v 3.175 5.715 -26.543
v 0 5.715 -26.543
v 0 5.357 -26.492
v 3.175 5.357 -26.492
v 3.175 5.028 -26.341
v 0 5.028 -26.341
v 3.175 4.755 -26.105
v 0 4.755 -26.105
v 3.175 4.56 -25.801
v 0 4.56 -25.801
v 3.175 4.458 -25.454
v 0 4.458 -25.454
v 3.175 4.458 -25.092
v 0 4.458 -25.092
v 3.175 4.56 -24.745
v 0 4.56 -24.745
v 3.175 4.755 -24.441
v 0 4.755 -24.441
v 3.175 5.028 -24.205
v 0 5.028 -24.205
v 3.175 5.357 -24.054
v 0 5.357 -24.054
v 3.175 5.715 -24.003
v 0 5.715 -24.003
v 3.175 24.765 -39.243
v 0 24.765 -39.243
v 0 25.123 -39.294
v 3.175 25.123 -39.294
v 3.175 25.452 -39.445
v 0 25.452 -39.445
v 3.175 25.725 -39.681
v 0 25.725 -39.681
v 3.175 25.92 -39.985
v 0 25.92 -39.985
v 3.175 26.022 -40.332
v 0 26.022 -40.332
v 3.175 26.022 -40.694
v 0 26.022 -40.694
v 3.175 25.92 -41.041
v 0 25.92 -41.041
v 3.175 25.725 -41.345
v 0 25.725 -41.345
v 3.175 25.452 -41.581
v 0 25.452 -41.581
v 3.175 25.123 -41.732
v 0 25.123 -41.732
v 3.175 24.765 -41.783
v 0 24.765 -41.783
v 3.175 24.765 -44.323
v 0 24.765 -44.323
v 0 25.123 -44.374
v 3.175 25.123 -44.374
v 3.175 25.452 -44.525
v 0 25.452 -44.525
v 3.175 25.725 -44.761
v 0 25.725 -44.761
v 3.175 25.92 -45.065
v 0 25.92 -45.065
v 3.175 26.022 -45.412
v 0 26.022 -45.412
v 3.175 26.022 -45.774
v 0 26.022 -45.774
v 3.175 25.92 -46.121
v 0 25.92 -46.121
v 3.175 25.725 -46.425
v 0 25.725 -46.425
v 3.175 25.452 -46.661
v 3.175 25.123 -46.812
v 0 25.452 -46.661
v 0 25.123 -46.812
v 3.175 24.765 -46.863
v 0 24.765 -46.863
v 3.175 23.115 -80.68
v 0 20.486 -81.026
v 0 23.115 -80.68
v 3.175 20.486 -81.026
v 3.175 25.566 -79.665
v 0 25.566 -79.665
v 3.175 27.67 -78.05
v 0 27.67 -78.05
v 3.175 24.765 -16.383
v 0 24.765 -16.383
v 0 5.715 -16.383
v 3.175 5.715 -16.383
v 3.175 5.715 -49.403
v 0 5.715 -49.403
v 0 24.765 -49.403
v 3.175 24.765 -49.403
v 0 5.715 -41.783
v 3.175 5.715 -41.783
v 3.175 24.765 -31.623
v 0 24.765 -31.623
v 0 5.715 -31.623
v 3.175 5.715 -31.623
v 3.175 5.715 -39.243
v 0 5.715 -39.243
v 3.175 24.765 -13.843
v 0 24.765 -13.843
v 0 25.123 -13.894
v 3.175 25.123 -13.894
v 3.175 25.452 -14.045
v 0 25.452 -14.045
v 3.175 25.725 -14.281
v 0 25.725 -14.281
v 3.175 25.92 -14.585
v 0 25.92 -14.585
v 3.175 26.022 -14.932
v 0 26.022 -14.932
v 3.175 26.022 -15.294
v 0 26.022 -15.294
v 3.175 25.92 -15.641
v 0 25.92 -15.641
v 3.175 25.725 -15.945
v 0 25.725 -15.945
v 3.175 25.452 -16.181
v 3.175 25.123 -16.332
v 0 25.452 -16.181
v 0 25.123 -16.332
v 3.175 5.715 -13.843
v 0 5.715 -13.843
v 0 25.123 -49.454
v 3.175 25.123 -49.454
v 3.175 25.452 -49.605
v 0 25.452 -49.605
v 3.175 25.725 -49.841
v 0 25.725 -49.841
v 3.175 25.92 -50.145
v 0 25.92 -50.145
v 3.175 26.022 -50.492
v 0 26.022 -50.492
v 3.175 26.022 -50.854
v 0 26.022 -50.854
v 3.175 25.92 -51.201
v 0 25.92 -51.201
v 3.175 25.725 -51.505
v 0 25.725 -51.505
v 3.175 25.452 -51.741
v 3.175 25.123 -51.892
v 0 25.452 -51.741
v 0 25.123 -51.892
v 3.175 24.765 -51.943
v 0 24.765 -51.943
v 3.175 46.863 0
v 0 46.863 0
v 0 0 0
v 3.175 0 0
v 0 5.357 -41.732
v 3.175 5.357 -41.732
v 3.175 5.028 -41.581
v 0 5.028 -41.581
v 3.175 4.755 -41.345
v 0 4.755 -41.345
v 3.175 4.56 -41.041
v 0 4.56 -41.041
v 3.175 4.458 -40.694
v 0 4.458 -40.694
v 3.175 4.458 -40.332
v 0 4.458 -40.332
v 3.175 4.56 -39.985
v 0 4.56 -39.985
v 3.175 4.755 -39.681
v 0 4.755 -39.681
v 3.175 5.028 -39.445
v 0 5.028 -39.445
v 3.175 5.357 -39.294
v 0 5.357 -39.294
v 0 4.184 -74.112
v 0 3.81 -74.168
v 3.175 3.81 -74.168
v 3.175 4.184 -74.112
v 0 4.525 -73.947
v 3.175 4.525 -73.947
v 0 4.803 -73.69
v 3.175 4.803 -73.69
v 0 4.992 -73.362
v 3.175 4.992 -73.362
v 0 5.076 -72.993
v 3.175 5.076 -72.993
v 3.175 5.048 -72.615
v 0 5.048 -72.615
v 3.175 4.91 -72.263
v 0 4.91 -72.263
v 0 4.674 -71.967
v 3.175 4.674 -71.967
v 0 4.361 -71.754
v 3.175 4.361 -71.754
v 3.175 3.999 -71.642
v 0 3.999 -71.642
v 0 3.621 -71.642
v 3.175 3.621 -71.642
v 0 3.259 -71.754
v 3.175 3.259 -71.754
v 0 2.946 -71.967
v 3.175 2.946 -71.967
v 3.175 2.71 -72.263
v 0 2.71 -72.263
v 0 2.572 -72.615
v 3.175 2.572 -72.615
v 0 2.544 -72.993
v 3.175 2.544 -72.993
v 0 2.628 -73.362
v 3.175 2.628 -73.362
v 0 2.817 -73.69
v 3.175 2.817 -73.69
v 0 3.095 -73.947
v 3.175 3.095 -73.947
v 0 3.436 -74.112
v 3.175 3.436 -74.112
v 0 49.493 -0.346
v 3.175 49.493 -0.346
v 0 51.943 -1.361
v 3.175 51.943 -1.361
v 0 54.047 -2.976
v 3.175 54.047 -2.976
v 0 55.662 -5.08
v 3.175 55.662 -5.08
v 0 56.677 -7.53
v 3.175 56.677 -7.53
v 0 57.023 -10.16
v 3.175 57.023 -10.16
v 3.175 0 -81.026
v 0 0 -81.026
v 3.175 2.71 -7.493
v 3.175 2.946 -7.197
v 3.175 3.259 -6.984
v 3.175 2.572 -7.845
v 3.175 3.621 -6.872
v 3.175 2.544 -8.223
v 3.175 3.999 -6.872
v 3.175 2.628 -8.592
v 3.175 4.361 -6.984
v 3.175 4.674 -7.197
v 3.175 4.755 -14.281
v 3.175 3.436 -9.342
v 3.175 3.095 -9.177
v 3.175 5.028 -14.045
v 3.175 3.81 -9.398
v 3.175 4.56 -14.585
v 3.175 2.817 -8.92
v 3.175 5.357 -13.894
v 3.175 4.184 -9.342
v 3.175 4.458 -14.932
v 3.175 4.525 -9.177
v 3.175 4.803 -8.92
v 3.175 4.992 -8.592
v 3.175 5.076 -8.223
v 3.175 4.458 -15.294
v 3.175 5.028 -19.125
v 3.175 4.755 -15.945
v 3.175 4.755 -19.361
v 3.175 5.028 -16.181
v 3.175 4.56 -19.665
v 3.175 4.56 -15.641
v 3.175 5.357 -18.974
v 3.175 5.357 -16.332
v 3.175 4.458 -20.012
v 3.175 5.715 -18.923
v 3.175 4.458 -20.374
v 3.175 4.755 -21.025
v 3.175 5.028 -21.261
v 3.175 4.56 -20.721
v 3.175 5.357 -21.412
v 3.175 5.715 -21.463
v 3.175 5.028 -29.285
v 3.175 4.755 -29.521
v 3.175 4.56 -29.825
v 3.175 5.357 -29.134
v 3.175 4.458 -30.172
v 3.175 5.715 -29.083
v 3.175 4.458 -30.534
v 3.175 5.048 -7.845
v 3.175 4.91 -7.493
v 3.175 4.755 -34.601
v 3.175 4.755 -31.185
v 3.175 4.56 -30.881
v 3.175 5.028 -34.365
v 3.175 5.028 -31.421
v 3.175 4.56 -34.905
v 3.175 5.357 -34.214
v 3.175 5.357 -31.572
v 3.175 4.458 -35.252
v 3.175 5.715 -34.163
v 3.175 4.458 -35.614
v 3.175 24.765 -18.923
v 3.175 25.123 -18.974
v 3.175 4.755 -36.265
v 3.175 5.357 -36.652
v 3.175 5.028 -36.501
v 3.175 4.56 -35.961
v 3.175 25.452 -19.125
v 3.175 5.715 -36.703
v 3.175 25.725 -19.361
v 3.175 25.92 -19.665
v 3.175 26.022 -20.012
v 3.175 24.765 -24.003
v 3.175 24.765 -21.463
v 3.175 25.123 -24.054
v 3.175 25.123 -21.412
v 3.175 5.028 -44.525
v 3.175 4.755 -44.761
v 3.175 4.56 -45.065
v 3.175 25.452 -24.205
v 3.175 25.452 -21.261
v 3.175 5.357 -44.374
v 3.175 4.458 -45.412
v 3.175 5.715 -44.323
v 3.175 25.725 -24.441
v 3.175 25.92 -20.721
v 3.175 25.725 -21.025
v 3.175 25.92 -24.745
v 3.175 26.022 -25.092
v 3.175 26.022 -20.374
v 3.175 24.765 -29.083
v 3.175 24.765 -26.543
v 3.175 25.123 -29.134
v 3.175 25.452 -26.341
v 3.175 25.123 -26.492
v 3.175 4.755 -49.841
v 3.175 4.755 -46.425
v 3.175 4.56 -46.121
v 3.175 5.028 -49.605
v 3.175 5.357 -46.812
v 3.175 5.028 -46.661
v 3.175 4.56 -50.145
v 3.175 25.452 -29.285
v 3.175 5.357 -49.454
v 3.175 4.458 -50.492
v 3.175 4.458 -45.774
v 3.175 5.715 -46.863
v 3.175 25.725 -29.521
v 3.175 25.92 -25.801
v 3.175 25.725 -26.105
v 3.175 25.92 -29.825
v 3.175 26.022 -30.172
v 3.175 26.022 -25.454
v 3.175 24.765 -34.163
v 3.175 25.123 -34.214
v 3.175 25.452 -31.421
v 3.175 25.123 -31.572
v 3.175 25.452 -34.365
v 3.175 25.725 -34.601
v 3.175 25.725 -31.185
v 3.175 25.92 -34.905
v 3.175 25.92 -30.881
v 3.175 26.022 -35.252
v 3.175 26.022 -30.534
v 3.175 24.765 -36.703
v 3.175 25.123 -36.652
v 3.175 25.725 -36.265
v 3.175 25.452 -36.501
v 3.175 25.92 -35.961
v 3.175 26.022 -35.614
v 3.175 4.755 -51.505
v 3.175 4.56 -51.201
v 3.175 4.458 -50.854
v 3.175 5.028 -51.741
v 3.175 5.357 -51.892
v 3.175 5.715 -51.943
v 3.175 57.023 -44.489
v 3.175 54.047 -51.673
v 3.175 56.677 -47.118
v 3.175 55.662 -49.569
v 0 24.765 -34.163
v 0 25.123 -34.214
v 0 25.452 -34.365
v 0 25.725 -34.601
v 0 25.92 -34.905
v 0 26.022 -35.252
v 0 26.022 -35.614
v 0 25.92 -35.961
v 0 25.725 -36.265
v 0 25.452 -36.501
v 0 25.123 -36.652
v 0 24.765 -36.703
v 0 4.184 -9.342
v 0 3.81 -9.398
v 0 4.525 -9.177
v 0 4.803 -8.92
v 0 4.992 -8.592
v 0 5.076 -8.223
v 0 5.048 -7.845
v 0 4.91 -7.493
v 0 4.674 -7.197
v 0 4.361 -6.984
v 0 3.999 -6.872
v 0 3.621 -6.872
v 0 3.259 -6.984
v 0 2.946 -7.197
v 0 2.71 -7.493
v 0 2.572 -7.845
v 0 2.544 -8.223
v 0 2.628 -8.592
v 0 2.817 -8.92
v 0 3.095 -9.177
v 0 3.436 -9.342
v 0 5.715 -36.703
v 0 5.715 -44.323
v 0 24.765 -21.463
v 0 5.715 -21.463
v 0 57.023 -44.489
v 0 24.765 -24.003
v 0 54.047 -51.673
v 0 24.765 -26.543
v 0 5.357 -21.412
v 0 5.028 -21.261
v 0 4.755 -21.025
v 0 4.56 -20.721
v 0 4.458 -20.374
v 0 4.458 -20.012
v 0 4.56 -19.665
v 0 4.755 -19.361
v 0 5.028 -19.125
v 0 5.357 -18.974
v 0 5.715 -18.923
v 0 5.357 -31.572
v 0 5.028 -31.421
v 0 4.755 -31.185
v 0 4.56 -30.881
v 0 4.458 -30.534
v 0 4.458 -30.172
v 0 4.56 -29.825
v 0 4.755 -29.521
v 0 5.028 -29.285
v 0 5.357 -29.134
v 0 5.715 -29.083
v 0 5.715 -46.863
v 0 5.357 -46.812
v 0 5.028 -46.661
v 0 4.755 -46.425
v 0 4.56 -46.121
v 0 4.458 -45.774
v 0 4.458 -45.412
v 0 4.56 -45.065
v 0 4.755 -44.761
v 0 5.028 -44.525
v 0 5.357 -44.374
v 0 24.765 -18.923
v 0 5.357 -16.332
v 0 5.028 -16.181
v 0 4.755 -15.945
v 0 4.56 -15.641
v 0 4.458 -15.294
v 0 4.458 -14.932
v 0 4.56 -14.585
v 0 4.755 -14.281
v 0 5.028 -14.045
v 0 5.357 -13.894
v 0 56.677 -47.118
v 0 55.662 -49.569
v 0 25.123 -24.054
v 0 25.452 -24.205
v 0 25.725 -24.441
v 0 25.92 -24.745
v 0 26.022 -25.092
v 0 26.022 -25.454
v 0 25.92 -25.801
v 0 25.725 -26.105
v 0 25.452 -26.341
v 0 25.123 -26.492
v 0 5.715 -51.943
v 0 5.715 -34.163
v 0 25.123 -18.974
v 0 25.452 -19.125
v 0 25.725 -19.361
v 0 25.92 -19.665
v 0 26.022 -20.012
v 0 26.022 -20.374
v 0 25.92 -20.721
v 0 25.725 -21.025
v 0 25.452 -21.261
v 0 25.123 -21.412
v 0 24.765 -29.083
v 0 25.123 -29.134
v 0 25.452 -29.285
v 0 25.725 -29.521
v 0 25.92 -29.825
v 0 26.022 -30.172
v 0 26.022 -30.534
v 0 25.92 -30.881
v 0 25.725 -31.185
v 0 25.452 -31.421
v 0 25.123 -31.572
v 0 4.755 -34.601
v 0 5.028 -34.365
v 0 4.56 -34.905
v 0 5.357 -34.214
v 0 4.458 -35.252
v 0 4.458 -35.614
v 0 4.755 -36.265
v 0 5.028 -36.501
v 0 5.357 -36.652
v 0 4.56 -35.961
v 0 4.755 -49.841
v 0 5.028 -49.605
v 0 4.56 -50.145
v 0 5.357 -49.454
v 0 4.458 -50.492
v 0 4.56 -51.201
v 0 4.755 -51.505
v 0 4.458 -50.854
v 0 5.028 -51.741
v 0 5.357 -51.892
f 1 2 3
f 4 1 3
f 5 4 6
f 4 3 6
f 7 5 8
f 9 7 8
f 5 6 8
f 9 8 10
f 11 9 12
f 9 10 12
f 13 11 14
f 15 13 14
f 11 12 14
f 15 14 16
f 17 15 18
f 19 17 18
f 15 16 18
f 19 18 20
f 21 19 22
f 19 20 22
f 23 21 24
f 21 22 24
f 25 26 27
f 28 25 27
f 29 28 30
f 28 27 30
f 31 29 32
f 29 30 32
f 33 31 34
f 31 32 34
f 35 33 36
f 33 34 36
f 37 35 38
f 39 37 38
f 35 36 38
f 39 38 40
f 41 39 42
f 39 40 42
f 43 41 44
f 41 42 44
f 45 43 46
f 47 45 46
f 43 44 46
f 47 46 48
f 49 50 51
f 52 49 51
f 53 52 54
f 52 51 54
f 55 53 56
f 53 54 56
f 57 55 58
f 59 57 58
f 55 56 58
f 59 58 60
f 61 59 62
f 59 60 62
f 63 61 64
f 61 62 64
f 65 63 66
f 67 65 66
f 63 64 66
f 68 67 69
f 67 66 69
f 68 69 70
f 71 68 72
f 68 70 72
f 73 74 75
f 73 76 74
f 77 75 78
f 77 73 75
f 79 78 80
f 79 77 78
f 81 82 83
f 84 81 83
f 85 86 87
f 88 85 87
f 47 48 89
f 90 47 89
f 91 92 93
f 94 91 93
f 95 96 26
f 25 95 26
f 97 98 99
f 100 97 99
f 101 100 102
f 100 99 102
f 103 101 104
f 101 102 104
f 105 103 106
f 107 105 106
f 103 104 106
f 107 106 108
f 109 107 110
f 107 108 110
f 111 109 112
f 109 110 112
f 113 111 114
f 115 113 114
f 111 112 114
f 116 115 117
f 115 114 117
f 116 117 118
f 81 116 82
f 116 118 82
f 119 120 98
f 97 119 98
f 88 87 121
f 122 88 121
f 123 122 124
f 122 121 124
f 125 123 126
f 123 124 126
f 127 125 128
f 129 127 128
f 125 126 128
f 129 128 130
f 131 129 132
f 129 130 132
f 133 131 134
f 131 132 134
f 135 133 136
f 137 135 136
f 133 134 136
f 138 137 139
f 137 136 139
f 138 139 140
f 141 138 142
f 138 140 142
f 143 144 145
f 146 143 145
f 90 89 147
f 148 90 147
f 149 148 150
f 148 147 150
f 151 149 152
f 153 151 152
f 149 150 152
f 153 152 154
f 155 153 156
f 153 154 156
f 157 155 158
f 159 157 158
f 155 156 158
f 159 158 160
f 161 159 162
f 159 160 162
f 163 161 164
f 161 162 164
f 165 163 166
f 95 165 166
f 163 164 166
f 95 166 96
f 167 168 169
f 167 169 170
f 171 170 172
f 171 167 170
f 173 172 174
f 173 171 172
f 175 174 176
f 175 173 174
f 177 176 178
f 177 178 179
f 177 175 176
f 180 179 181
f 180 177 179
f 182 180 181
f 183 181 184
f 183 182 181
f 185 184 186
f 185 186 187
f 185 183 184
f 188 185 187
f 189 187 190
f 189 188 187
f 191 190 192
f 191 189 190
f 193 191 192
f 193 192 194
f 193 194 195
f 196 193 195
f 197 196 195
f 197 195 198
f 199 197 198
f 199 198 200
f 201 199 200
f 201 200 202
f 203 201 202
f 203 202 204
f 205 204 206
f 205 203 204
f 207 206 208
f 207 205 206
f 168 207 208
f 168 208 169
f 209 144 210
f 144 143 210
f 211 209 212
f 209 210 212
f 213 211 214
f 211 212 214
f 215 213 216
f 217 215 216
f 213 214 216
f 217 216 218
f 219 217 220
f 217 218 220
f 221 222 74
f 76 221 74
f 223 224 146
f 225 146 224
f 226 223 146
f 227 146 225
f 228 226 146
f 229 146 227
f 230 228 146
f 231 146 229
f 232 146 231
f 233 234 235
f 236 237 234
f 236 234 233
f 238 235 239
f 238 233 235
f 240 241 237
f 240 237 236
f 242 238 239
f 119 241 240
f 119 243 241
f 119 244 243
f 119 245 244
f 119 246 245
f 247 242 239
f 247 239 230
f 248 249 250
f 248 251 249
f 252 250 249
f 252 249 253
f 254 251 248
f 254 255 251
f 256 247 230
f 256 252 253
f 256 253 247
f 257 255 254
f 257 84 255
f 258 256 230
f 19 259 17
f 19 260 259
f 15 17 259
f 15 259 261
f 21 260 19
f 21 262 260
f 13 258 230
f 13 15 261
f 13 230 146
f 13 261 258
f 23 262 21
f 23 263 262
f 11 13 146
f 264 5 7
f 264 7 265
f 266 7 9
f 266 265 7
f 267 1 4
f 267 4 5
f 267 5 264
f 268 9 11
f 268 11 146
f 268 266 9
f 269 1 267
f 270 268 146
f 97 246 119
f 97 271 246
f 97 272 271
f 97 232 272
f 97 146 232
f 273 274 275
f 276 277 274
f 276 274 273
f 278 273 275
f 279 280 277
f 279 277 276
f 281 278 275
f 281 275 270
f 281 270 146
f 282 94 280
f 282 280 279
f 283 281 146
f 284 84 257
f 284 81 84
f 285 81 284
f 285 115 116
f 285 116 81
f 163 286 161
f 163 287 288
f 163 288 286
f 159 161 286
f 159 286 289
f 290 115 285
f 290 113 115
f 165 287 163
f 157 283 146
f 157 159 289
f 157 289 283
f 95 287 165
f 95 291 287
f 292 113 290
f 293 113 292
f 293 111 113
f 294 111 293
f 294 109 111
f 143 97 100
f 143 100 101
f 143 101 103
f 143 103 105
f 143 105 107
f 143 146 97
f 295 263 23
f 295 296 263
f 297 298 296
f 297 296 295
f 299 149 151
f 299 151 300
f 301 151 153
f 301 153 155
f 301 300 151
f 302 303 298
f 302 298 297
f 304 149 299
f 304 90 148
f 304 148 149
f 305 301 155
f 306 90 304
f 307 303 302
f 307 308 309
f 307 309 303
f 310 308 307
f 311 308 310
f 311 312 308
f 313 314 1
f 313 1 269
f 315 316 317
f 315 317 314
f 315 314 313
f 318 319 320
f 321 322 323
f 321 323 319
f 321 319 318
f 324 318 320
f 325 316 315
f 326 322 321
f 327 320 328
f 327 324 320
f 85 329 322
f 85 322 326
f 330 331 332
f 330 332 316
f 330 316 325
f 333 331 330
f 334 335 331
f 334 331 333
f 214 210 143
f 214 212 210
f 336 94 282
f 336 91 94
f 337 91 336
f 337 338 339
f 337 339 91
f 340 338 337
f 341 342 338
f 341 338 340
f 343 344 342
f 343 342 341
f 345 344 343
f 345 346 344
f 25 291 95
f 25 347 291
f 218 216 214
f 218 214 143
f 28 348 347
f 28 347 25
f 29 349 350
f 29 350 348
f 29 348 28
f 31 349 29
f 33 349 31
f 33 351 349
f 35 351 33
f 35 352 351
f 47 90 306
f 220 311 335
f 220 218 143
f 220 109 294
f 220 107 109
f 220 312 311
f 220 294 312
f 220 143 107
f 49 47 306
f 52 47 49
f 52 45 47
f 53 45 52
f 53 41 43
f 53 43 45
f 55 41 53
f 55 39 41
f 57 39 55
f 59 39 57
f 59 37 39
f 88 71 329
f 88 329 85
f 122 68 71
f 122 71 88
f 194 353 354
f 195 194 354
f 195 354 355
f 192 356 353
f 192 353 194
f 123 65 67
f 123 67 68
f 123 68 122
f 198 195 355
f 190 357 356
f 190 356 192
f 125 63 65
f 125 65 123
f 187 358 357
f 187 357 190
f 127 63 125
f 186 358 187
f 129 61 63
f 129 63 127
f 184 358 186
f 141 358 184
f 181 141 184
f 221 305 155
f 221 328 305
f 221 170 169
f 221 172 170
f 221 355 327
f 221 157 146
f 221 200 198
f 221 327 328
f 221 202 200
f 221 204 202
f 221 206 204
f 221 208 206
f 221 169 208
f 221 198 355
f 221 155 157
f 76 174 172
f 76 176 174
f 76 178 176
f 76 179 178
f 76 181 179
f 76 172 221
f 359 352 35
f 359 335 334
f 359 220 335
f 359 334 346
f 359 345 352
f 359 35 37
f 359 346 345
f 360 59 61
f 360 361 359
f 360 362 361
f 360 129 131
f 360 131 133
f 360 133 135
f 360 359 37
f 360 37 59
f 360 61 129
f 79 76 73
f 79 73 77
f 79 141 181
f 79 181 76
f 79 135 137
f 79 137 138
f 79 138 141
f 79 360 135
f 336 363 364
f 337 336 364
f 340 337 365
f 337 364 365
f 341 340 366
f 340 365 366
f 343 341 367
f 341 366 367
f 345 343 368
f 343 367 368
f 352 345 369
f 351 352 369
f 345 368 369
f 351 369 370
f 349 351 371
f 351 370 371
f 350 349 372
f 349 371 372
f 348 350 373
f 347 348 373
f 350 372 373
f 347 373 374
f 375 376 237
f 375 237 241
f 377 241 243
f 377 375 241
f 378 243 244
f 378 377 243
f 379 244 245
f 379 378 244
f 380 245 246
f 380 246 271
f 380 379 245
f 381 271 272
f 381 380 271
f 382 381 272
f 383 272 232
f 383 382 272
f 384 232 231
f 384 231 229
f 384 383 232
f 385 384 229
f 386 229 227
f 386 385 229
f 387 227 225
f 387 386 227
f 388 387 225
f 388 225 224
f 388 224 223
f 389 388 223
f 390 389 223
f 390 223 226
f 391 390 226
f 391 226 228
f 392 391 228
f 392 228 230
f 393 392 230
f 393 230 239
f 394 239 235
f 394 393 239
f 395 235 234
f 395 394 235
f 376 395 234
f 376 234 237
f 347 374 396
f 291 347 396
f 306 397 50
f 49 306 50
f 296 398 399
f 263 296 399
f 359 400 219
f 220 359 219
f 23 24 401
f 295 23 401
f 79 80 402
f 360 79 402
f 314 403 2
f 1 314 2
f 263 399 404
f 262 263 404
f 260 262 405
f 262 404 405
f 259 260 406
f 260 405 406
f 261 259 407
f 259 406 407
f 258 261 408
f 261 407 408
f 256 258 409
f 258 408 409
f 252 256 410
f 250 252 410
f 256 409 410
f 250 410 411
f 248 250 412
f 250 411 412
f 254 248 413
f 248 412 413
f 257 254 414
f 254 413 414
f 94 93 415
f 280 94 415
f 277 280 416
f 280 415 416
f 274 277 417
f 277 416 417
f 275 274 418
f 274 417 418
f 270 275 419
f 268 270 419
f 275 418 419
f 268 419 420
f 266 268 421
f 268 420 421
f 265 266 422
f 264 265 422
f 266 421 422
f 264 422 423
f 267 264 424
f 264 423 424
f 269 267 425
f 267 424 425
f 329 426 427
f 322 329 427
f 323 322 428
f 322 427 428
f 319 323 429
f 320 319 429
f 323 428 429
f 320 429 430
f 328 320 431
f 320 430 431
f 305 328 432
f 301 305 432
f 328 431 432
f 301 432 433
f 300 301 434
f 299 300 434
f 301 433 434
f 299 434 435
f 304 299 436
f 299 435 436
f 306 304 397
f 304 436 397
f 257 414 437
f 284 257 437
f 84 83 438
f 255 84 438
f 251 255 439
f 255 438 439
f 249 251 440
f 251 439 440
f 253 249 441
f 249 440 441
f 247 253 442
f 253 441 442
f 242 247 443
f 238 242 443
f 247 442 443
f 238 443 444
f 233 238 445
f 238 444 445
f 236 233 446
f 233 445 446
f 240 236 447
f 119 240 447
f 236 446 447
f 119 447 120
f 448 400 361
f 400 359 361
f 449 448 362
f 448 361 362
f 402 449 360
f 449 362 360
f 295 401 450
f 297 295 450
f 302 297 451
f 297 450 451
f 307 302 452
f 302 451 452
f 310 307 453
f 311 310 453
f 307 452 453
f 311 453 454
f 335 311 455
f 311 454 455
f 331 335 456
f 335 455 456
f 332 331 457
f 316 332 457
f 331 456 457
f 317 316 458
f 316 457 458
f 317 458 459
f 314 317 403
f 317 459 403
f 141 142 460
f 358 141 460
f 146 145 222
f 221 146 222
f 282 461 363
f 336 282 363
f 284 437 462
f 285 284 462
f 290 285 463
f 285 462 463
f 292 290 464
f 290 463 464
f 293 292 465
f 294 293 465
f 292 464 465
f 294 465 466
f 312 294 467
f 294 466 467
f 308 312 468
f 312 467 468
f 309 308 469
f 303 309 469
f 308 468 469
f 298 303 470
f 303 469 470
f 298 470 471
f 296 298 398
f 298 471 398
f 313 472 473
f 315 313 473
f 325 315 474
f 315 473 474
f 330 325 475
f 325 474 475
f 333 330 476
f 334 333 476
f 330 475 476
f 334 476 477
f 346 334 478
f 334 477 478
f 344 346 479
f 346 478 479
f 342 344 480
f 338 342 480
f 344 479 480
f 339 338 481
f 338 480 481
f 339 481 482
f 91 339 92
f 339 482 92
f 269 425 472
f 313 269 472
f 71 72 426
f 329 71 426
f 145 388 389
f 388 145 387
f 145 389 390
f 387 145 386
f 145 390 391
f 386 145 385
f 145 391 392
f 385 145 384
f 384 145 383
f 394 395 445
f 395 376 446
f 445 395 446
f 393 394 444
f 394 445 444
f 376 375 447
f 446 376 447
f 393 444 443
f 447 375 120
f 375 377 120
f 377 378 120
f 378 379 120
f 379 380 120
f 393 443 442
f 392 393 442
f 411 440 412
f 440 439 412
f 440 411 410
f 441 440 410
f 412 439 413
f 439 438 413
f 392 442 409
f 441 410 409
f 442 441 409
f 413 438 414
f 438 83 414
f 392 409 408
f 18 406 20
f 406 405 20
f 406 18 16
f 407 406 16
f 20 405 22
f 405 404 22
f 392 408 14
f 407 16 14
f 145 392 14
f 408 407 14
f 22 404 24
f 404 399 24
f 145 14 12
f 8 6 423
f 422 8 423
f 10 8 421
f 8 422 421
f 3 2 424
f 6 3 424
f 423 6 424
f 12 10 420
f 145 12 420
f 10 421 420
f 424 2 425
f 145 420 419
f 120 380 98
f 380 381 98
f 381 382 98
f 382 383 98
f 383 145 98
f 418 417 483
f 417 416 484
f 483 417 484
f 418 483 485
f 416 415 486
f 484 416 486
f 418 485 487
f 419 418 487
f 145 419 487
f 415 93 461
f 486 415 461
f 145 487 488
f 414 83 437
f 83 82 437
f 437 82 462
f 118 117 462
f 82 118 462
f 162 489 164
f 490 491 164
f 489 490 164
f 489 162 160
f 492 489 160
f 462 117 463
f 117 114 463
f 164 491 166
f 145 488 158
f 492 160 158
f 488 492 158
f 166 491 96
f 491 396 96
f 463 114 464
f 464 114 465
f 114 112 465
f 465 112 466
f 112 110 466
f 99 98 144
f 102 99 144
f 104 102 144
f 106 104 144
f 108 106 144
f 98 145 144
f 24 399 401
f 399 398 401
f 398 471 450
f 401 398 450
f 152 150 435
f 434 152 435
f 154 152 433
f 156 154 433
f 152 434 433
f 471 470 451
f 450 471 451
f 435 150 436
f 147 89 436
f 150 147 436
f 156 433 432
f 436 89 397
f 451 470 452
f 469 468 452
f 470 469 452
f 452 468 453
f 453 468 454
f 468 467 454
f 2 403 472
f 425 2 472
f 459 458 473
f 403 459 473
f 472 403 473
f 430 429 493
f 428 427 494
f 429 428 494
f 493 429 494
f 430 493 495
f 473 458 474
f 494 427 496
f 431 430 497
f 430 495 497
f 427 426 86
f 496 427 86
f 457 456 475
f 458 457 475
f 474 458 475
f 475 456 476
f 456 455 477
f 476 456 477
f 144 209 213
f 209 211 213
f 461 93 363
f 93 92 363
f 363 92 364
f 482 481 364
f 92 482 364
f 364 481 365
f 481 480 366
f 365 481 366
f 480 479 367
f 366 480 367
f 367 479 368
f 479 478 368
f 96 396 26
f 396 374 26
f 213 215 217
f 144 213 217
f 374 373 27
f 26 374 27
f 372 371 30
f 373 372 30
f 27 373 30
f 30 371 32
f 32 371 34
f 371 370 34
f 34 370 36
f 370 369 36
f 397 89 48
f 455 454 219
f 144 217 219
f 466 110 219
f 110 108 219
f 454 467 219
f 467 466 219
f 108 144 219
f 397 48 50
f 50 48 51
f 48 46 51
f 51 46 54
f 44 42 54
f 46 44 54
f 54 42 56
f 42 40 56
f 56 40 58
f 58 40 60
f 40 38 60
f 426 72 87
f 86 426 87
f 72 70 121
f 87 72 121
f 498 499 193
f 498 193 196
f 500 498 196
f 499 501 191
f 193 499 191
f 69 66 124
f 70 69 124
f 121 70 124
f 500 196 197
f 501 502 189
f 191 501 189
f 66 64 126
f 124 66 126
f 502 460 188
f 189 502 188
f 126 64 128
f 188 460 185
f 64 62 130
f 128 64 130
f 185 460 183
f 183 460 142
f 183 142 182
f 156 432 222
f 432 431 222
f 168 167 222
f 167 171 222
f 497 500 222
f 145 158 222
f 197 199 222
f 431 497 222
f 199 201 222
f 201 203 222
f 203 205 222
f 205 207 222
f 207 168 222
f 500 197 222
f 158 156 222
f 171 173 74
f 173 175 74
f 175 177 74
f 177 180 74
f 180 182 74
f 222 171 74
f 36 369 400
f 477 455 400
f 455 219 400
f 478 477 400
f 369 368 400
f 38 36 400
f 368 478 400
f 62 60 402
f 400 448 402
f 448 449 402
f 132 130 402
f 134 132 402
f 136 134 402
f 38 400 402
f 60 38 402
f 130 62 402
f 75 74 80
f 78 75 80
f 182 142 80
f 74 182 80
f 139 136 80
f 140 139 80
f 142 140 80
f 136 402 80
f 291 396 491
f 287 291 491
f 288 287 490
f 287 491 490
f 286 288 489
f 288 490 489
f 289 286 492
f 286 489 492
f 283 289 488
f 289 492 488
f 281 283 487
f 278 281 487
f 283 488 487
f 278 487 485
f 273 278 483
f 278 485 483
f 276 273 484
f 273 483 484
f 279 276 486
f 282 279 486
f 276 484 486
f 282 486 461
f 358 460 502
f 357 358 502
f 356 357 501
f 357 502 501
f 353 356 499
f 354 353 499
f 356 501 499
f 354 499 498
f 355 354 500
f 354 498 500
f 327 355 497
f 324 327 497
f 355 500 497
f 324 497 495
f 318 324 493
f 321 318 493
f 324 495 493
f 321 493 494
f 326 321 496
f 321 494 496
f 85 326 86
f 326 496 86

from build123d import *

# Parameters (mm, degrees)
SKETCH1_R           = 1.27
BOSS_EXTRUDE1_DEPTH = 3.175
FILLET1_R           = 10.16


with BuildPart() as part:
    # Sketch1 → Boss-Extrude1 (new body)
    with BuildSketch(Plane(origin=(0, 0, 0), x_dir=(0, 0, -1), z_dir=(1, 0, 0))):
        Polygon((0, 0), (81.026, 0), (81.026, 24.694077964), (48.697077964, 57.023), (0, 57.023), align=None)
        with Locations((8.128, 3.81)):
            Circle(SKETCH1_R, mode=Mode.SUBTRACT)
        with Locations((72.898, 3.81)):
            Circle(SKETCH1_R, mode=Mode.SUBTRACT)
        with BuildLine():
            Line((51.943, 24.765), (51.943, 5.715))
            ThreePointArc((51.943, 5.715), (50.673, 4.445), (49.403, 5.715))
            Line((49.403, 5.715), (49.403, 24.765))
            ThreePointArc((49.403, 24.765), (50.673, 26.035), (51.943, 24.765))
        make_face(mode=Mode.SUBTRACT)
        with BuildLine():
            Line((46.863, 24.765), (46.863, 5.715))
            ThreePointArc((46.863, 5.715), (45.593, 4.445), (44.323, 5.715))
            Line((44.323, 5.715), (44.323, 24.765))
            ThreePointArc((44.323, 24.765), (45.593, 26.035), (46.863, 24.765))
        make_face(mode=Mode.SUBTRACT)
        with BuildLine():
            Line((16.383, 24.765), (16.383, 5.715))
            ThreePointArc((16.383, 5.715), (15.113, 4.445), (13.843, 5.715))
            Line((13.843, 5.715), (13.843, 24.765))
            ThreePointArc((13.843, 24.765), (15.113, 26.035), (16.383, 24.765))
        make_face(mode=Mode.SUBTRACT)
        with BuildLine():
            Line((41.783, 24.765), (41.783, 5.715))
            ThreePointArc((41.783, 5.715), (40.513, 4.445), (39.243, 5.715))
            Line((39.243, 5.715), (39.243, 24.765))
            ThreePointArc((39.243, 24.765), (40.513, 26.035), (41.783, 24.765))
        make_face(mode=Mode.SUBTRACT)
        with BuildLine():
            Line((36.703, 24.765), (36.703, 5.715))
            ThreePointArc((36.703, 5.715), (35.433, 4.445), (34.163, 5.715))
            Line((34.163, 5.715), (34.163, 24.765))
            ThreePointArc((34.163, 24.765), (35.433, 26.035), (36.703, 24.765))
        make_face(mode=Mode.SUBTRACT)
        with BuildLine():
            Line((31.623, 24.765), (31.623, 5.715))
            ThreePointArc((31.623, 5.715), (30.353, 4.445), (29.083, 5.715))
            Line((29.083, 5.715), (29.083, 24.765))
            ThreePointArc((29.083, 24.765), (30.353, 26.035), (31.623, 24.765))
        make_face(mode=Mode.SUBTRACT)
        with BuildLine():
            Line((26.543, 24.765), (26.543, 5.715))
            ThreePointArc((26.543, 5.715), (25.273, 4.445), (24.003, 5.715))
            Line((24.003, 5.715), (24.003, 24.765))
            ThreePointArc((24.003, 24.765), (25.273, 26.035), (26.543, 24.765))
        make_face(mode=Mode.SUBTRACT)
        with BuildLine():
            Line((21.463, 24.765), (21.463, 5.715))
            ThreePointArc((21.463, 5.715), (20.193, 4.445), (18.923, 5.715))
            Line((18.923, 5.715), (18.923, 24.765))
            ThreePointArc((18.923, 24.765), (20.193, 26.035), (21.463, 24.765))
        make_face(mode=Mode.SUBTRACT)
    extrude(amount=BOSS_EXTRUDE1_DEPTH)

    # Fillet1
    fillet1_edges = [part.edges().sort_by_distance(p)[0] for p in [
        (1.5875, 57.023, -48.697077964),
        (1.5875, 24.694077964, -81.026),
        (1.5875, 57.023, 0),
    ]]
    fillet(fillet1_edges, radius=FILLET1_R)


solid = part.part
